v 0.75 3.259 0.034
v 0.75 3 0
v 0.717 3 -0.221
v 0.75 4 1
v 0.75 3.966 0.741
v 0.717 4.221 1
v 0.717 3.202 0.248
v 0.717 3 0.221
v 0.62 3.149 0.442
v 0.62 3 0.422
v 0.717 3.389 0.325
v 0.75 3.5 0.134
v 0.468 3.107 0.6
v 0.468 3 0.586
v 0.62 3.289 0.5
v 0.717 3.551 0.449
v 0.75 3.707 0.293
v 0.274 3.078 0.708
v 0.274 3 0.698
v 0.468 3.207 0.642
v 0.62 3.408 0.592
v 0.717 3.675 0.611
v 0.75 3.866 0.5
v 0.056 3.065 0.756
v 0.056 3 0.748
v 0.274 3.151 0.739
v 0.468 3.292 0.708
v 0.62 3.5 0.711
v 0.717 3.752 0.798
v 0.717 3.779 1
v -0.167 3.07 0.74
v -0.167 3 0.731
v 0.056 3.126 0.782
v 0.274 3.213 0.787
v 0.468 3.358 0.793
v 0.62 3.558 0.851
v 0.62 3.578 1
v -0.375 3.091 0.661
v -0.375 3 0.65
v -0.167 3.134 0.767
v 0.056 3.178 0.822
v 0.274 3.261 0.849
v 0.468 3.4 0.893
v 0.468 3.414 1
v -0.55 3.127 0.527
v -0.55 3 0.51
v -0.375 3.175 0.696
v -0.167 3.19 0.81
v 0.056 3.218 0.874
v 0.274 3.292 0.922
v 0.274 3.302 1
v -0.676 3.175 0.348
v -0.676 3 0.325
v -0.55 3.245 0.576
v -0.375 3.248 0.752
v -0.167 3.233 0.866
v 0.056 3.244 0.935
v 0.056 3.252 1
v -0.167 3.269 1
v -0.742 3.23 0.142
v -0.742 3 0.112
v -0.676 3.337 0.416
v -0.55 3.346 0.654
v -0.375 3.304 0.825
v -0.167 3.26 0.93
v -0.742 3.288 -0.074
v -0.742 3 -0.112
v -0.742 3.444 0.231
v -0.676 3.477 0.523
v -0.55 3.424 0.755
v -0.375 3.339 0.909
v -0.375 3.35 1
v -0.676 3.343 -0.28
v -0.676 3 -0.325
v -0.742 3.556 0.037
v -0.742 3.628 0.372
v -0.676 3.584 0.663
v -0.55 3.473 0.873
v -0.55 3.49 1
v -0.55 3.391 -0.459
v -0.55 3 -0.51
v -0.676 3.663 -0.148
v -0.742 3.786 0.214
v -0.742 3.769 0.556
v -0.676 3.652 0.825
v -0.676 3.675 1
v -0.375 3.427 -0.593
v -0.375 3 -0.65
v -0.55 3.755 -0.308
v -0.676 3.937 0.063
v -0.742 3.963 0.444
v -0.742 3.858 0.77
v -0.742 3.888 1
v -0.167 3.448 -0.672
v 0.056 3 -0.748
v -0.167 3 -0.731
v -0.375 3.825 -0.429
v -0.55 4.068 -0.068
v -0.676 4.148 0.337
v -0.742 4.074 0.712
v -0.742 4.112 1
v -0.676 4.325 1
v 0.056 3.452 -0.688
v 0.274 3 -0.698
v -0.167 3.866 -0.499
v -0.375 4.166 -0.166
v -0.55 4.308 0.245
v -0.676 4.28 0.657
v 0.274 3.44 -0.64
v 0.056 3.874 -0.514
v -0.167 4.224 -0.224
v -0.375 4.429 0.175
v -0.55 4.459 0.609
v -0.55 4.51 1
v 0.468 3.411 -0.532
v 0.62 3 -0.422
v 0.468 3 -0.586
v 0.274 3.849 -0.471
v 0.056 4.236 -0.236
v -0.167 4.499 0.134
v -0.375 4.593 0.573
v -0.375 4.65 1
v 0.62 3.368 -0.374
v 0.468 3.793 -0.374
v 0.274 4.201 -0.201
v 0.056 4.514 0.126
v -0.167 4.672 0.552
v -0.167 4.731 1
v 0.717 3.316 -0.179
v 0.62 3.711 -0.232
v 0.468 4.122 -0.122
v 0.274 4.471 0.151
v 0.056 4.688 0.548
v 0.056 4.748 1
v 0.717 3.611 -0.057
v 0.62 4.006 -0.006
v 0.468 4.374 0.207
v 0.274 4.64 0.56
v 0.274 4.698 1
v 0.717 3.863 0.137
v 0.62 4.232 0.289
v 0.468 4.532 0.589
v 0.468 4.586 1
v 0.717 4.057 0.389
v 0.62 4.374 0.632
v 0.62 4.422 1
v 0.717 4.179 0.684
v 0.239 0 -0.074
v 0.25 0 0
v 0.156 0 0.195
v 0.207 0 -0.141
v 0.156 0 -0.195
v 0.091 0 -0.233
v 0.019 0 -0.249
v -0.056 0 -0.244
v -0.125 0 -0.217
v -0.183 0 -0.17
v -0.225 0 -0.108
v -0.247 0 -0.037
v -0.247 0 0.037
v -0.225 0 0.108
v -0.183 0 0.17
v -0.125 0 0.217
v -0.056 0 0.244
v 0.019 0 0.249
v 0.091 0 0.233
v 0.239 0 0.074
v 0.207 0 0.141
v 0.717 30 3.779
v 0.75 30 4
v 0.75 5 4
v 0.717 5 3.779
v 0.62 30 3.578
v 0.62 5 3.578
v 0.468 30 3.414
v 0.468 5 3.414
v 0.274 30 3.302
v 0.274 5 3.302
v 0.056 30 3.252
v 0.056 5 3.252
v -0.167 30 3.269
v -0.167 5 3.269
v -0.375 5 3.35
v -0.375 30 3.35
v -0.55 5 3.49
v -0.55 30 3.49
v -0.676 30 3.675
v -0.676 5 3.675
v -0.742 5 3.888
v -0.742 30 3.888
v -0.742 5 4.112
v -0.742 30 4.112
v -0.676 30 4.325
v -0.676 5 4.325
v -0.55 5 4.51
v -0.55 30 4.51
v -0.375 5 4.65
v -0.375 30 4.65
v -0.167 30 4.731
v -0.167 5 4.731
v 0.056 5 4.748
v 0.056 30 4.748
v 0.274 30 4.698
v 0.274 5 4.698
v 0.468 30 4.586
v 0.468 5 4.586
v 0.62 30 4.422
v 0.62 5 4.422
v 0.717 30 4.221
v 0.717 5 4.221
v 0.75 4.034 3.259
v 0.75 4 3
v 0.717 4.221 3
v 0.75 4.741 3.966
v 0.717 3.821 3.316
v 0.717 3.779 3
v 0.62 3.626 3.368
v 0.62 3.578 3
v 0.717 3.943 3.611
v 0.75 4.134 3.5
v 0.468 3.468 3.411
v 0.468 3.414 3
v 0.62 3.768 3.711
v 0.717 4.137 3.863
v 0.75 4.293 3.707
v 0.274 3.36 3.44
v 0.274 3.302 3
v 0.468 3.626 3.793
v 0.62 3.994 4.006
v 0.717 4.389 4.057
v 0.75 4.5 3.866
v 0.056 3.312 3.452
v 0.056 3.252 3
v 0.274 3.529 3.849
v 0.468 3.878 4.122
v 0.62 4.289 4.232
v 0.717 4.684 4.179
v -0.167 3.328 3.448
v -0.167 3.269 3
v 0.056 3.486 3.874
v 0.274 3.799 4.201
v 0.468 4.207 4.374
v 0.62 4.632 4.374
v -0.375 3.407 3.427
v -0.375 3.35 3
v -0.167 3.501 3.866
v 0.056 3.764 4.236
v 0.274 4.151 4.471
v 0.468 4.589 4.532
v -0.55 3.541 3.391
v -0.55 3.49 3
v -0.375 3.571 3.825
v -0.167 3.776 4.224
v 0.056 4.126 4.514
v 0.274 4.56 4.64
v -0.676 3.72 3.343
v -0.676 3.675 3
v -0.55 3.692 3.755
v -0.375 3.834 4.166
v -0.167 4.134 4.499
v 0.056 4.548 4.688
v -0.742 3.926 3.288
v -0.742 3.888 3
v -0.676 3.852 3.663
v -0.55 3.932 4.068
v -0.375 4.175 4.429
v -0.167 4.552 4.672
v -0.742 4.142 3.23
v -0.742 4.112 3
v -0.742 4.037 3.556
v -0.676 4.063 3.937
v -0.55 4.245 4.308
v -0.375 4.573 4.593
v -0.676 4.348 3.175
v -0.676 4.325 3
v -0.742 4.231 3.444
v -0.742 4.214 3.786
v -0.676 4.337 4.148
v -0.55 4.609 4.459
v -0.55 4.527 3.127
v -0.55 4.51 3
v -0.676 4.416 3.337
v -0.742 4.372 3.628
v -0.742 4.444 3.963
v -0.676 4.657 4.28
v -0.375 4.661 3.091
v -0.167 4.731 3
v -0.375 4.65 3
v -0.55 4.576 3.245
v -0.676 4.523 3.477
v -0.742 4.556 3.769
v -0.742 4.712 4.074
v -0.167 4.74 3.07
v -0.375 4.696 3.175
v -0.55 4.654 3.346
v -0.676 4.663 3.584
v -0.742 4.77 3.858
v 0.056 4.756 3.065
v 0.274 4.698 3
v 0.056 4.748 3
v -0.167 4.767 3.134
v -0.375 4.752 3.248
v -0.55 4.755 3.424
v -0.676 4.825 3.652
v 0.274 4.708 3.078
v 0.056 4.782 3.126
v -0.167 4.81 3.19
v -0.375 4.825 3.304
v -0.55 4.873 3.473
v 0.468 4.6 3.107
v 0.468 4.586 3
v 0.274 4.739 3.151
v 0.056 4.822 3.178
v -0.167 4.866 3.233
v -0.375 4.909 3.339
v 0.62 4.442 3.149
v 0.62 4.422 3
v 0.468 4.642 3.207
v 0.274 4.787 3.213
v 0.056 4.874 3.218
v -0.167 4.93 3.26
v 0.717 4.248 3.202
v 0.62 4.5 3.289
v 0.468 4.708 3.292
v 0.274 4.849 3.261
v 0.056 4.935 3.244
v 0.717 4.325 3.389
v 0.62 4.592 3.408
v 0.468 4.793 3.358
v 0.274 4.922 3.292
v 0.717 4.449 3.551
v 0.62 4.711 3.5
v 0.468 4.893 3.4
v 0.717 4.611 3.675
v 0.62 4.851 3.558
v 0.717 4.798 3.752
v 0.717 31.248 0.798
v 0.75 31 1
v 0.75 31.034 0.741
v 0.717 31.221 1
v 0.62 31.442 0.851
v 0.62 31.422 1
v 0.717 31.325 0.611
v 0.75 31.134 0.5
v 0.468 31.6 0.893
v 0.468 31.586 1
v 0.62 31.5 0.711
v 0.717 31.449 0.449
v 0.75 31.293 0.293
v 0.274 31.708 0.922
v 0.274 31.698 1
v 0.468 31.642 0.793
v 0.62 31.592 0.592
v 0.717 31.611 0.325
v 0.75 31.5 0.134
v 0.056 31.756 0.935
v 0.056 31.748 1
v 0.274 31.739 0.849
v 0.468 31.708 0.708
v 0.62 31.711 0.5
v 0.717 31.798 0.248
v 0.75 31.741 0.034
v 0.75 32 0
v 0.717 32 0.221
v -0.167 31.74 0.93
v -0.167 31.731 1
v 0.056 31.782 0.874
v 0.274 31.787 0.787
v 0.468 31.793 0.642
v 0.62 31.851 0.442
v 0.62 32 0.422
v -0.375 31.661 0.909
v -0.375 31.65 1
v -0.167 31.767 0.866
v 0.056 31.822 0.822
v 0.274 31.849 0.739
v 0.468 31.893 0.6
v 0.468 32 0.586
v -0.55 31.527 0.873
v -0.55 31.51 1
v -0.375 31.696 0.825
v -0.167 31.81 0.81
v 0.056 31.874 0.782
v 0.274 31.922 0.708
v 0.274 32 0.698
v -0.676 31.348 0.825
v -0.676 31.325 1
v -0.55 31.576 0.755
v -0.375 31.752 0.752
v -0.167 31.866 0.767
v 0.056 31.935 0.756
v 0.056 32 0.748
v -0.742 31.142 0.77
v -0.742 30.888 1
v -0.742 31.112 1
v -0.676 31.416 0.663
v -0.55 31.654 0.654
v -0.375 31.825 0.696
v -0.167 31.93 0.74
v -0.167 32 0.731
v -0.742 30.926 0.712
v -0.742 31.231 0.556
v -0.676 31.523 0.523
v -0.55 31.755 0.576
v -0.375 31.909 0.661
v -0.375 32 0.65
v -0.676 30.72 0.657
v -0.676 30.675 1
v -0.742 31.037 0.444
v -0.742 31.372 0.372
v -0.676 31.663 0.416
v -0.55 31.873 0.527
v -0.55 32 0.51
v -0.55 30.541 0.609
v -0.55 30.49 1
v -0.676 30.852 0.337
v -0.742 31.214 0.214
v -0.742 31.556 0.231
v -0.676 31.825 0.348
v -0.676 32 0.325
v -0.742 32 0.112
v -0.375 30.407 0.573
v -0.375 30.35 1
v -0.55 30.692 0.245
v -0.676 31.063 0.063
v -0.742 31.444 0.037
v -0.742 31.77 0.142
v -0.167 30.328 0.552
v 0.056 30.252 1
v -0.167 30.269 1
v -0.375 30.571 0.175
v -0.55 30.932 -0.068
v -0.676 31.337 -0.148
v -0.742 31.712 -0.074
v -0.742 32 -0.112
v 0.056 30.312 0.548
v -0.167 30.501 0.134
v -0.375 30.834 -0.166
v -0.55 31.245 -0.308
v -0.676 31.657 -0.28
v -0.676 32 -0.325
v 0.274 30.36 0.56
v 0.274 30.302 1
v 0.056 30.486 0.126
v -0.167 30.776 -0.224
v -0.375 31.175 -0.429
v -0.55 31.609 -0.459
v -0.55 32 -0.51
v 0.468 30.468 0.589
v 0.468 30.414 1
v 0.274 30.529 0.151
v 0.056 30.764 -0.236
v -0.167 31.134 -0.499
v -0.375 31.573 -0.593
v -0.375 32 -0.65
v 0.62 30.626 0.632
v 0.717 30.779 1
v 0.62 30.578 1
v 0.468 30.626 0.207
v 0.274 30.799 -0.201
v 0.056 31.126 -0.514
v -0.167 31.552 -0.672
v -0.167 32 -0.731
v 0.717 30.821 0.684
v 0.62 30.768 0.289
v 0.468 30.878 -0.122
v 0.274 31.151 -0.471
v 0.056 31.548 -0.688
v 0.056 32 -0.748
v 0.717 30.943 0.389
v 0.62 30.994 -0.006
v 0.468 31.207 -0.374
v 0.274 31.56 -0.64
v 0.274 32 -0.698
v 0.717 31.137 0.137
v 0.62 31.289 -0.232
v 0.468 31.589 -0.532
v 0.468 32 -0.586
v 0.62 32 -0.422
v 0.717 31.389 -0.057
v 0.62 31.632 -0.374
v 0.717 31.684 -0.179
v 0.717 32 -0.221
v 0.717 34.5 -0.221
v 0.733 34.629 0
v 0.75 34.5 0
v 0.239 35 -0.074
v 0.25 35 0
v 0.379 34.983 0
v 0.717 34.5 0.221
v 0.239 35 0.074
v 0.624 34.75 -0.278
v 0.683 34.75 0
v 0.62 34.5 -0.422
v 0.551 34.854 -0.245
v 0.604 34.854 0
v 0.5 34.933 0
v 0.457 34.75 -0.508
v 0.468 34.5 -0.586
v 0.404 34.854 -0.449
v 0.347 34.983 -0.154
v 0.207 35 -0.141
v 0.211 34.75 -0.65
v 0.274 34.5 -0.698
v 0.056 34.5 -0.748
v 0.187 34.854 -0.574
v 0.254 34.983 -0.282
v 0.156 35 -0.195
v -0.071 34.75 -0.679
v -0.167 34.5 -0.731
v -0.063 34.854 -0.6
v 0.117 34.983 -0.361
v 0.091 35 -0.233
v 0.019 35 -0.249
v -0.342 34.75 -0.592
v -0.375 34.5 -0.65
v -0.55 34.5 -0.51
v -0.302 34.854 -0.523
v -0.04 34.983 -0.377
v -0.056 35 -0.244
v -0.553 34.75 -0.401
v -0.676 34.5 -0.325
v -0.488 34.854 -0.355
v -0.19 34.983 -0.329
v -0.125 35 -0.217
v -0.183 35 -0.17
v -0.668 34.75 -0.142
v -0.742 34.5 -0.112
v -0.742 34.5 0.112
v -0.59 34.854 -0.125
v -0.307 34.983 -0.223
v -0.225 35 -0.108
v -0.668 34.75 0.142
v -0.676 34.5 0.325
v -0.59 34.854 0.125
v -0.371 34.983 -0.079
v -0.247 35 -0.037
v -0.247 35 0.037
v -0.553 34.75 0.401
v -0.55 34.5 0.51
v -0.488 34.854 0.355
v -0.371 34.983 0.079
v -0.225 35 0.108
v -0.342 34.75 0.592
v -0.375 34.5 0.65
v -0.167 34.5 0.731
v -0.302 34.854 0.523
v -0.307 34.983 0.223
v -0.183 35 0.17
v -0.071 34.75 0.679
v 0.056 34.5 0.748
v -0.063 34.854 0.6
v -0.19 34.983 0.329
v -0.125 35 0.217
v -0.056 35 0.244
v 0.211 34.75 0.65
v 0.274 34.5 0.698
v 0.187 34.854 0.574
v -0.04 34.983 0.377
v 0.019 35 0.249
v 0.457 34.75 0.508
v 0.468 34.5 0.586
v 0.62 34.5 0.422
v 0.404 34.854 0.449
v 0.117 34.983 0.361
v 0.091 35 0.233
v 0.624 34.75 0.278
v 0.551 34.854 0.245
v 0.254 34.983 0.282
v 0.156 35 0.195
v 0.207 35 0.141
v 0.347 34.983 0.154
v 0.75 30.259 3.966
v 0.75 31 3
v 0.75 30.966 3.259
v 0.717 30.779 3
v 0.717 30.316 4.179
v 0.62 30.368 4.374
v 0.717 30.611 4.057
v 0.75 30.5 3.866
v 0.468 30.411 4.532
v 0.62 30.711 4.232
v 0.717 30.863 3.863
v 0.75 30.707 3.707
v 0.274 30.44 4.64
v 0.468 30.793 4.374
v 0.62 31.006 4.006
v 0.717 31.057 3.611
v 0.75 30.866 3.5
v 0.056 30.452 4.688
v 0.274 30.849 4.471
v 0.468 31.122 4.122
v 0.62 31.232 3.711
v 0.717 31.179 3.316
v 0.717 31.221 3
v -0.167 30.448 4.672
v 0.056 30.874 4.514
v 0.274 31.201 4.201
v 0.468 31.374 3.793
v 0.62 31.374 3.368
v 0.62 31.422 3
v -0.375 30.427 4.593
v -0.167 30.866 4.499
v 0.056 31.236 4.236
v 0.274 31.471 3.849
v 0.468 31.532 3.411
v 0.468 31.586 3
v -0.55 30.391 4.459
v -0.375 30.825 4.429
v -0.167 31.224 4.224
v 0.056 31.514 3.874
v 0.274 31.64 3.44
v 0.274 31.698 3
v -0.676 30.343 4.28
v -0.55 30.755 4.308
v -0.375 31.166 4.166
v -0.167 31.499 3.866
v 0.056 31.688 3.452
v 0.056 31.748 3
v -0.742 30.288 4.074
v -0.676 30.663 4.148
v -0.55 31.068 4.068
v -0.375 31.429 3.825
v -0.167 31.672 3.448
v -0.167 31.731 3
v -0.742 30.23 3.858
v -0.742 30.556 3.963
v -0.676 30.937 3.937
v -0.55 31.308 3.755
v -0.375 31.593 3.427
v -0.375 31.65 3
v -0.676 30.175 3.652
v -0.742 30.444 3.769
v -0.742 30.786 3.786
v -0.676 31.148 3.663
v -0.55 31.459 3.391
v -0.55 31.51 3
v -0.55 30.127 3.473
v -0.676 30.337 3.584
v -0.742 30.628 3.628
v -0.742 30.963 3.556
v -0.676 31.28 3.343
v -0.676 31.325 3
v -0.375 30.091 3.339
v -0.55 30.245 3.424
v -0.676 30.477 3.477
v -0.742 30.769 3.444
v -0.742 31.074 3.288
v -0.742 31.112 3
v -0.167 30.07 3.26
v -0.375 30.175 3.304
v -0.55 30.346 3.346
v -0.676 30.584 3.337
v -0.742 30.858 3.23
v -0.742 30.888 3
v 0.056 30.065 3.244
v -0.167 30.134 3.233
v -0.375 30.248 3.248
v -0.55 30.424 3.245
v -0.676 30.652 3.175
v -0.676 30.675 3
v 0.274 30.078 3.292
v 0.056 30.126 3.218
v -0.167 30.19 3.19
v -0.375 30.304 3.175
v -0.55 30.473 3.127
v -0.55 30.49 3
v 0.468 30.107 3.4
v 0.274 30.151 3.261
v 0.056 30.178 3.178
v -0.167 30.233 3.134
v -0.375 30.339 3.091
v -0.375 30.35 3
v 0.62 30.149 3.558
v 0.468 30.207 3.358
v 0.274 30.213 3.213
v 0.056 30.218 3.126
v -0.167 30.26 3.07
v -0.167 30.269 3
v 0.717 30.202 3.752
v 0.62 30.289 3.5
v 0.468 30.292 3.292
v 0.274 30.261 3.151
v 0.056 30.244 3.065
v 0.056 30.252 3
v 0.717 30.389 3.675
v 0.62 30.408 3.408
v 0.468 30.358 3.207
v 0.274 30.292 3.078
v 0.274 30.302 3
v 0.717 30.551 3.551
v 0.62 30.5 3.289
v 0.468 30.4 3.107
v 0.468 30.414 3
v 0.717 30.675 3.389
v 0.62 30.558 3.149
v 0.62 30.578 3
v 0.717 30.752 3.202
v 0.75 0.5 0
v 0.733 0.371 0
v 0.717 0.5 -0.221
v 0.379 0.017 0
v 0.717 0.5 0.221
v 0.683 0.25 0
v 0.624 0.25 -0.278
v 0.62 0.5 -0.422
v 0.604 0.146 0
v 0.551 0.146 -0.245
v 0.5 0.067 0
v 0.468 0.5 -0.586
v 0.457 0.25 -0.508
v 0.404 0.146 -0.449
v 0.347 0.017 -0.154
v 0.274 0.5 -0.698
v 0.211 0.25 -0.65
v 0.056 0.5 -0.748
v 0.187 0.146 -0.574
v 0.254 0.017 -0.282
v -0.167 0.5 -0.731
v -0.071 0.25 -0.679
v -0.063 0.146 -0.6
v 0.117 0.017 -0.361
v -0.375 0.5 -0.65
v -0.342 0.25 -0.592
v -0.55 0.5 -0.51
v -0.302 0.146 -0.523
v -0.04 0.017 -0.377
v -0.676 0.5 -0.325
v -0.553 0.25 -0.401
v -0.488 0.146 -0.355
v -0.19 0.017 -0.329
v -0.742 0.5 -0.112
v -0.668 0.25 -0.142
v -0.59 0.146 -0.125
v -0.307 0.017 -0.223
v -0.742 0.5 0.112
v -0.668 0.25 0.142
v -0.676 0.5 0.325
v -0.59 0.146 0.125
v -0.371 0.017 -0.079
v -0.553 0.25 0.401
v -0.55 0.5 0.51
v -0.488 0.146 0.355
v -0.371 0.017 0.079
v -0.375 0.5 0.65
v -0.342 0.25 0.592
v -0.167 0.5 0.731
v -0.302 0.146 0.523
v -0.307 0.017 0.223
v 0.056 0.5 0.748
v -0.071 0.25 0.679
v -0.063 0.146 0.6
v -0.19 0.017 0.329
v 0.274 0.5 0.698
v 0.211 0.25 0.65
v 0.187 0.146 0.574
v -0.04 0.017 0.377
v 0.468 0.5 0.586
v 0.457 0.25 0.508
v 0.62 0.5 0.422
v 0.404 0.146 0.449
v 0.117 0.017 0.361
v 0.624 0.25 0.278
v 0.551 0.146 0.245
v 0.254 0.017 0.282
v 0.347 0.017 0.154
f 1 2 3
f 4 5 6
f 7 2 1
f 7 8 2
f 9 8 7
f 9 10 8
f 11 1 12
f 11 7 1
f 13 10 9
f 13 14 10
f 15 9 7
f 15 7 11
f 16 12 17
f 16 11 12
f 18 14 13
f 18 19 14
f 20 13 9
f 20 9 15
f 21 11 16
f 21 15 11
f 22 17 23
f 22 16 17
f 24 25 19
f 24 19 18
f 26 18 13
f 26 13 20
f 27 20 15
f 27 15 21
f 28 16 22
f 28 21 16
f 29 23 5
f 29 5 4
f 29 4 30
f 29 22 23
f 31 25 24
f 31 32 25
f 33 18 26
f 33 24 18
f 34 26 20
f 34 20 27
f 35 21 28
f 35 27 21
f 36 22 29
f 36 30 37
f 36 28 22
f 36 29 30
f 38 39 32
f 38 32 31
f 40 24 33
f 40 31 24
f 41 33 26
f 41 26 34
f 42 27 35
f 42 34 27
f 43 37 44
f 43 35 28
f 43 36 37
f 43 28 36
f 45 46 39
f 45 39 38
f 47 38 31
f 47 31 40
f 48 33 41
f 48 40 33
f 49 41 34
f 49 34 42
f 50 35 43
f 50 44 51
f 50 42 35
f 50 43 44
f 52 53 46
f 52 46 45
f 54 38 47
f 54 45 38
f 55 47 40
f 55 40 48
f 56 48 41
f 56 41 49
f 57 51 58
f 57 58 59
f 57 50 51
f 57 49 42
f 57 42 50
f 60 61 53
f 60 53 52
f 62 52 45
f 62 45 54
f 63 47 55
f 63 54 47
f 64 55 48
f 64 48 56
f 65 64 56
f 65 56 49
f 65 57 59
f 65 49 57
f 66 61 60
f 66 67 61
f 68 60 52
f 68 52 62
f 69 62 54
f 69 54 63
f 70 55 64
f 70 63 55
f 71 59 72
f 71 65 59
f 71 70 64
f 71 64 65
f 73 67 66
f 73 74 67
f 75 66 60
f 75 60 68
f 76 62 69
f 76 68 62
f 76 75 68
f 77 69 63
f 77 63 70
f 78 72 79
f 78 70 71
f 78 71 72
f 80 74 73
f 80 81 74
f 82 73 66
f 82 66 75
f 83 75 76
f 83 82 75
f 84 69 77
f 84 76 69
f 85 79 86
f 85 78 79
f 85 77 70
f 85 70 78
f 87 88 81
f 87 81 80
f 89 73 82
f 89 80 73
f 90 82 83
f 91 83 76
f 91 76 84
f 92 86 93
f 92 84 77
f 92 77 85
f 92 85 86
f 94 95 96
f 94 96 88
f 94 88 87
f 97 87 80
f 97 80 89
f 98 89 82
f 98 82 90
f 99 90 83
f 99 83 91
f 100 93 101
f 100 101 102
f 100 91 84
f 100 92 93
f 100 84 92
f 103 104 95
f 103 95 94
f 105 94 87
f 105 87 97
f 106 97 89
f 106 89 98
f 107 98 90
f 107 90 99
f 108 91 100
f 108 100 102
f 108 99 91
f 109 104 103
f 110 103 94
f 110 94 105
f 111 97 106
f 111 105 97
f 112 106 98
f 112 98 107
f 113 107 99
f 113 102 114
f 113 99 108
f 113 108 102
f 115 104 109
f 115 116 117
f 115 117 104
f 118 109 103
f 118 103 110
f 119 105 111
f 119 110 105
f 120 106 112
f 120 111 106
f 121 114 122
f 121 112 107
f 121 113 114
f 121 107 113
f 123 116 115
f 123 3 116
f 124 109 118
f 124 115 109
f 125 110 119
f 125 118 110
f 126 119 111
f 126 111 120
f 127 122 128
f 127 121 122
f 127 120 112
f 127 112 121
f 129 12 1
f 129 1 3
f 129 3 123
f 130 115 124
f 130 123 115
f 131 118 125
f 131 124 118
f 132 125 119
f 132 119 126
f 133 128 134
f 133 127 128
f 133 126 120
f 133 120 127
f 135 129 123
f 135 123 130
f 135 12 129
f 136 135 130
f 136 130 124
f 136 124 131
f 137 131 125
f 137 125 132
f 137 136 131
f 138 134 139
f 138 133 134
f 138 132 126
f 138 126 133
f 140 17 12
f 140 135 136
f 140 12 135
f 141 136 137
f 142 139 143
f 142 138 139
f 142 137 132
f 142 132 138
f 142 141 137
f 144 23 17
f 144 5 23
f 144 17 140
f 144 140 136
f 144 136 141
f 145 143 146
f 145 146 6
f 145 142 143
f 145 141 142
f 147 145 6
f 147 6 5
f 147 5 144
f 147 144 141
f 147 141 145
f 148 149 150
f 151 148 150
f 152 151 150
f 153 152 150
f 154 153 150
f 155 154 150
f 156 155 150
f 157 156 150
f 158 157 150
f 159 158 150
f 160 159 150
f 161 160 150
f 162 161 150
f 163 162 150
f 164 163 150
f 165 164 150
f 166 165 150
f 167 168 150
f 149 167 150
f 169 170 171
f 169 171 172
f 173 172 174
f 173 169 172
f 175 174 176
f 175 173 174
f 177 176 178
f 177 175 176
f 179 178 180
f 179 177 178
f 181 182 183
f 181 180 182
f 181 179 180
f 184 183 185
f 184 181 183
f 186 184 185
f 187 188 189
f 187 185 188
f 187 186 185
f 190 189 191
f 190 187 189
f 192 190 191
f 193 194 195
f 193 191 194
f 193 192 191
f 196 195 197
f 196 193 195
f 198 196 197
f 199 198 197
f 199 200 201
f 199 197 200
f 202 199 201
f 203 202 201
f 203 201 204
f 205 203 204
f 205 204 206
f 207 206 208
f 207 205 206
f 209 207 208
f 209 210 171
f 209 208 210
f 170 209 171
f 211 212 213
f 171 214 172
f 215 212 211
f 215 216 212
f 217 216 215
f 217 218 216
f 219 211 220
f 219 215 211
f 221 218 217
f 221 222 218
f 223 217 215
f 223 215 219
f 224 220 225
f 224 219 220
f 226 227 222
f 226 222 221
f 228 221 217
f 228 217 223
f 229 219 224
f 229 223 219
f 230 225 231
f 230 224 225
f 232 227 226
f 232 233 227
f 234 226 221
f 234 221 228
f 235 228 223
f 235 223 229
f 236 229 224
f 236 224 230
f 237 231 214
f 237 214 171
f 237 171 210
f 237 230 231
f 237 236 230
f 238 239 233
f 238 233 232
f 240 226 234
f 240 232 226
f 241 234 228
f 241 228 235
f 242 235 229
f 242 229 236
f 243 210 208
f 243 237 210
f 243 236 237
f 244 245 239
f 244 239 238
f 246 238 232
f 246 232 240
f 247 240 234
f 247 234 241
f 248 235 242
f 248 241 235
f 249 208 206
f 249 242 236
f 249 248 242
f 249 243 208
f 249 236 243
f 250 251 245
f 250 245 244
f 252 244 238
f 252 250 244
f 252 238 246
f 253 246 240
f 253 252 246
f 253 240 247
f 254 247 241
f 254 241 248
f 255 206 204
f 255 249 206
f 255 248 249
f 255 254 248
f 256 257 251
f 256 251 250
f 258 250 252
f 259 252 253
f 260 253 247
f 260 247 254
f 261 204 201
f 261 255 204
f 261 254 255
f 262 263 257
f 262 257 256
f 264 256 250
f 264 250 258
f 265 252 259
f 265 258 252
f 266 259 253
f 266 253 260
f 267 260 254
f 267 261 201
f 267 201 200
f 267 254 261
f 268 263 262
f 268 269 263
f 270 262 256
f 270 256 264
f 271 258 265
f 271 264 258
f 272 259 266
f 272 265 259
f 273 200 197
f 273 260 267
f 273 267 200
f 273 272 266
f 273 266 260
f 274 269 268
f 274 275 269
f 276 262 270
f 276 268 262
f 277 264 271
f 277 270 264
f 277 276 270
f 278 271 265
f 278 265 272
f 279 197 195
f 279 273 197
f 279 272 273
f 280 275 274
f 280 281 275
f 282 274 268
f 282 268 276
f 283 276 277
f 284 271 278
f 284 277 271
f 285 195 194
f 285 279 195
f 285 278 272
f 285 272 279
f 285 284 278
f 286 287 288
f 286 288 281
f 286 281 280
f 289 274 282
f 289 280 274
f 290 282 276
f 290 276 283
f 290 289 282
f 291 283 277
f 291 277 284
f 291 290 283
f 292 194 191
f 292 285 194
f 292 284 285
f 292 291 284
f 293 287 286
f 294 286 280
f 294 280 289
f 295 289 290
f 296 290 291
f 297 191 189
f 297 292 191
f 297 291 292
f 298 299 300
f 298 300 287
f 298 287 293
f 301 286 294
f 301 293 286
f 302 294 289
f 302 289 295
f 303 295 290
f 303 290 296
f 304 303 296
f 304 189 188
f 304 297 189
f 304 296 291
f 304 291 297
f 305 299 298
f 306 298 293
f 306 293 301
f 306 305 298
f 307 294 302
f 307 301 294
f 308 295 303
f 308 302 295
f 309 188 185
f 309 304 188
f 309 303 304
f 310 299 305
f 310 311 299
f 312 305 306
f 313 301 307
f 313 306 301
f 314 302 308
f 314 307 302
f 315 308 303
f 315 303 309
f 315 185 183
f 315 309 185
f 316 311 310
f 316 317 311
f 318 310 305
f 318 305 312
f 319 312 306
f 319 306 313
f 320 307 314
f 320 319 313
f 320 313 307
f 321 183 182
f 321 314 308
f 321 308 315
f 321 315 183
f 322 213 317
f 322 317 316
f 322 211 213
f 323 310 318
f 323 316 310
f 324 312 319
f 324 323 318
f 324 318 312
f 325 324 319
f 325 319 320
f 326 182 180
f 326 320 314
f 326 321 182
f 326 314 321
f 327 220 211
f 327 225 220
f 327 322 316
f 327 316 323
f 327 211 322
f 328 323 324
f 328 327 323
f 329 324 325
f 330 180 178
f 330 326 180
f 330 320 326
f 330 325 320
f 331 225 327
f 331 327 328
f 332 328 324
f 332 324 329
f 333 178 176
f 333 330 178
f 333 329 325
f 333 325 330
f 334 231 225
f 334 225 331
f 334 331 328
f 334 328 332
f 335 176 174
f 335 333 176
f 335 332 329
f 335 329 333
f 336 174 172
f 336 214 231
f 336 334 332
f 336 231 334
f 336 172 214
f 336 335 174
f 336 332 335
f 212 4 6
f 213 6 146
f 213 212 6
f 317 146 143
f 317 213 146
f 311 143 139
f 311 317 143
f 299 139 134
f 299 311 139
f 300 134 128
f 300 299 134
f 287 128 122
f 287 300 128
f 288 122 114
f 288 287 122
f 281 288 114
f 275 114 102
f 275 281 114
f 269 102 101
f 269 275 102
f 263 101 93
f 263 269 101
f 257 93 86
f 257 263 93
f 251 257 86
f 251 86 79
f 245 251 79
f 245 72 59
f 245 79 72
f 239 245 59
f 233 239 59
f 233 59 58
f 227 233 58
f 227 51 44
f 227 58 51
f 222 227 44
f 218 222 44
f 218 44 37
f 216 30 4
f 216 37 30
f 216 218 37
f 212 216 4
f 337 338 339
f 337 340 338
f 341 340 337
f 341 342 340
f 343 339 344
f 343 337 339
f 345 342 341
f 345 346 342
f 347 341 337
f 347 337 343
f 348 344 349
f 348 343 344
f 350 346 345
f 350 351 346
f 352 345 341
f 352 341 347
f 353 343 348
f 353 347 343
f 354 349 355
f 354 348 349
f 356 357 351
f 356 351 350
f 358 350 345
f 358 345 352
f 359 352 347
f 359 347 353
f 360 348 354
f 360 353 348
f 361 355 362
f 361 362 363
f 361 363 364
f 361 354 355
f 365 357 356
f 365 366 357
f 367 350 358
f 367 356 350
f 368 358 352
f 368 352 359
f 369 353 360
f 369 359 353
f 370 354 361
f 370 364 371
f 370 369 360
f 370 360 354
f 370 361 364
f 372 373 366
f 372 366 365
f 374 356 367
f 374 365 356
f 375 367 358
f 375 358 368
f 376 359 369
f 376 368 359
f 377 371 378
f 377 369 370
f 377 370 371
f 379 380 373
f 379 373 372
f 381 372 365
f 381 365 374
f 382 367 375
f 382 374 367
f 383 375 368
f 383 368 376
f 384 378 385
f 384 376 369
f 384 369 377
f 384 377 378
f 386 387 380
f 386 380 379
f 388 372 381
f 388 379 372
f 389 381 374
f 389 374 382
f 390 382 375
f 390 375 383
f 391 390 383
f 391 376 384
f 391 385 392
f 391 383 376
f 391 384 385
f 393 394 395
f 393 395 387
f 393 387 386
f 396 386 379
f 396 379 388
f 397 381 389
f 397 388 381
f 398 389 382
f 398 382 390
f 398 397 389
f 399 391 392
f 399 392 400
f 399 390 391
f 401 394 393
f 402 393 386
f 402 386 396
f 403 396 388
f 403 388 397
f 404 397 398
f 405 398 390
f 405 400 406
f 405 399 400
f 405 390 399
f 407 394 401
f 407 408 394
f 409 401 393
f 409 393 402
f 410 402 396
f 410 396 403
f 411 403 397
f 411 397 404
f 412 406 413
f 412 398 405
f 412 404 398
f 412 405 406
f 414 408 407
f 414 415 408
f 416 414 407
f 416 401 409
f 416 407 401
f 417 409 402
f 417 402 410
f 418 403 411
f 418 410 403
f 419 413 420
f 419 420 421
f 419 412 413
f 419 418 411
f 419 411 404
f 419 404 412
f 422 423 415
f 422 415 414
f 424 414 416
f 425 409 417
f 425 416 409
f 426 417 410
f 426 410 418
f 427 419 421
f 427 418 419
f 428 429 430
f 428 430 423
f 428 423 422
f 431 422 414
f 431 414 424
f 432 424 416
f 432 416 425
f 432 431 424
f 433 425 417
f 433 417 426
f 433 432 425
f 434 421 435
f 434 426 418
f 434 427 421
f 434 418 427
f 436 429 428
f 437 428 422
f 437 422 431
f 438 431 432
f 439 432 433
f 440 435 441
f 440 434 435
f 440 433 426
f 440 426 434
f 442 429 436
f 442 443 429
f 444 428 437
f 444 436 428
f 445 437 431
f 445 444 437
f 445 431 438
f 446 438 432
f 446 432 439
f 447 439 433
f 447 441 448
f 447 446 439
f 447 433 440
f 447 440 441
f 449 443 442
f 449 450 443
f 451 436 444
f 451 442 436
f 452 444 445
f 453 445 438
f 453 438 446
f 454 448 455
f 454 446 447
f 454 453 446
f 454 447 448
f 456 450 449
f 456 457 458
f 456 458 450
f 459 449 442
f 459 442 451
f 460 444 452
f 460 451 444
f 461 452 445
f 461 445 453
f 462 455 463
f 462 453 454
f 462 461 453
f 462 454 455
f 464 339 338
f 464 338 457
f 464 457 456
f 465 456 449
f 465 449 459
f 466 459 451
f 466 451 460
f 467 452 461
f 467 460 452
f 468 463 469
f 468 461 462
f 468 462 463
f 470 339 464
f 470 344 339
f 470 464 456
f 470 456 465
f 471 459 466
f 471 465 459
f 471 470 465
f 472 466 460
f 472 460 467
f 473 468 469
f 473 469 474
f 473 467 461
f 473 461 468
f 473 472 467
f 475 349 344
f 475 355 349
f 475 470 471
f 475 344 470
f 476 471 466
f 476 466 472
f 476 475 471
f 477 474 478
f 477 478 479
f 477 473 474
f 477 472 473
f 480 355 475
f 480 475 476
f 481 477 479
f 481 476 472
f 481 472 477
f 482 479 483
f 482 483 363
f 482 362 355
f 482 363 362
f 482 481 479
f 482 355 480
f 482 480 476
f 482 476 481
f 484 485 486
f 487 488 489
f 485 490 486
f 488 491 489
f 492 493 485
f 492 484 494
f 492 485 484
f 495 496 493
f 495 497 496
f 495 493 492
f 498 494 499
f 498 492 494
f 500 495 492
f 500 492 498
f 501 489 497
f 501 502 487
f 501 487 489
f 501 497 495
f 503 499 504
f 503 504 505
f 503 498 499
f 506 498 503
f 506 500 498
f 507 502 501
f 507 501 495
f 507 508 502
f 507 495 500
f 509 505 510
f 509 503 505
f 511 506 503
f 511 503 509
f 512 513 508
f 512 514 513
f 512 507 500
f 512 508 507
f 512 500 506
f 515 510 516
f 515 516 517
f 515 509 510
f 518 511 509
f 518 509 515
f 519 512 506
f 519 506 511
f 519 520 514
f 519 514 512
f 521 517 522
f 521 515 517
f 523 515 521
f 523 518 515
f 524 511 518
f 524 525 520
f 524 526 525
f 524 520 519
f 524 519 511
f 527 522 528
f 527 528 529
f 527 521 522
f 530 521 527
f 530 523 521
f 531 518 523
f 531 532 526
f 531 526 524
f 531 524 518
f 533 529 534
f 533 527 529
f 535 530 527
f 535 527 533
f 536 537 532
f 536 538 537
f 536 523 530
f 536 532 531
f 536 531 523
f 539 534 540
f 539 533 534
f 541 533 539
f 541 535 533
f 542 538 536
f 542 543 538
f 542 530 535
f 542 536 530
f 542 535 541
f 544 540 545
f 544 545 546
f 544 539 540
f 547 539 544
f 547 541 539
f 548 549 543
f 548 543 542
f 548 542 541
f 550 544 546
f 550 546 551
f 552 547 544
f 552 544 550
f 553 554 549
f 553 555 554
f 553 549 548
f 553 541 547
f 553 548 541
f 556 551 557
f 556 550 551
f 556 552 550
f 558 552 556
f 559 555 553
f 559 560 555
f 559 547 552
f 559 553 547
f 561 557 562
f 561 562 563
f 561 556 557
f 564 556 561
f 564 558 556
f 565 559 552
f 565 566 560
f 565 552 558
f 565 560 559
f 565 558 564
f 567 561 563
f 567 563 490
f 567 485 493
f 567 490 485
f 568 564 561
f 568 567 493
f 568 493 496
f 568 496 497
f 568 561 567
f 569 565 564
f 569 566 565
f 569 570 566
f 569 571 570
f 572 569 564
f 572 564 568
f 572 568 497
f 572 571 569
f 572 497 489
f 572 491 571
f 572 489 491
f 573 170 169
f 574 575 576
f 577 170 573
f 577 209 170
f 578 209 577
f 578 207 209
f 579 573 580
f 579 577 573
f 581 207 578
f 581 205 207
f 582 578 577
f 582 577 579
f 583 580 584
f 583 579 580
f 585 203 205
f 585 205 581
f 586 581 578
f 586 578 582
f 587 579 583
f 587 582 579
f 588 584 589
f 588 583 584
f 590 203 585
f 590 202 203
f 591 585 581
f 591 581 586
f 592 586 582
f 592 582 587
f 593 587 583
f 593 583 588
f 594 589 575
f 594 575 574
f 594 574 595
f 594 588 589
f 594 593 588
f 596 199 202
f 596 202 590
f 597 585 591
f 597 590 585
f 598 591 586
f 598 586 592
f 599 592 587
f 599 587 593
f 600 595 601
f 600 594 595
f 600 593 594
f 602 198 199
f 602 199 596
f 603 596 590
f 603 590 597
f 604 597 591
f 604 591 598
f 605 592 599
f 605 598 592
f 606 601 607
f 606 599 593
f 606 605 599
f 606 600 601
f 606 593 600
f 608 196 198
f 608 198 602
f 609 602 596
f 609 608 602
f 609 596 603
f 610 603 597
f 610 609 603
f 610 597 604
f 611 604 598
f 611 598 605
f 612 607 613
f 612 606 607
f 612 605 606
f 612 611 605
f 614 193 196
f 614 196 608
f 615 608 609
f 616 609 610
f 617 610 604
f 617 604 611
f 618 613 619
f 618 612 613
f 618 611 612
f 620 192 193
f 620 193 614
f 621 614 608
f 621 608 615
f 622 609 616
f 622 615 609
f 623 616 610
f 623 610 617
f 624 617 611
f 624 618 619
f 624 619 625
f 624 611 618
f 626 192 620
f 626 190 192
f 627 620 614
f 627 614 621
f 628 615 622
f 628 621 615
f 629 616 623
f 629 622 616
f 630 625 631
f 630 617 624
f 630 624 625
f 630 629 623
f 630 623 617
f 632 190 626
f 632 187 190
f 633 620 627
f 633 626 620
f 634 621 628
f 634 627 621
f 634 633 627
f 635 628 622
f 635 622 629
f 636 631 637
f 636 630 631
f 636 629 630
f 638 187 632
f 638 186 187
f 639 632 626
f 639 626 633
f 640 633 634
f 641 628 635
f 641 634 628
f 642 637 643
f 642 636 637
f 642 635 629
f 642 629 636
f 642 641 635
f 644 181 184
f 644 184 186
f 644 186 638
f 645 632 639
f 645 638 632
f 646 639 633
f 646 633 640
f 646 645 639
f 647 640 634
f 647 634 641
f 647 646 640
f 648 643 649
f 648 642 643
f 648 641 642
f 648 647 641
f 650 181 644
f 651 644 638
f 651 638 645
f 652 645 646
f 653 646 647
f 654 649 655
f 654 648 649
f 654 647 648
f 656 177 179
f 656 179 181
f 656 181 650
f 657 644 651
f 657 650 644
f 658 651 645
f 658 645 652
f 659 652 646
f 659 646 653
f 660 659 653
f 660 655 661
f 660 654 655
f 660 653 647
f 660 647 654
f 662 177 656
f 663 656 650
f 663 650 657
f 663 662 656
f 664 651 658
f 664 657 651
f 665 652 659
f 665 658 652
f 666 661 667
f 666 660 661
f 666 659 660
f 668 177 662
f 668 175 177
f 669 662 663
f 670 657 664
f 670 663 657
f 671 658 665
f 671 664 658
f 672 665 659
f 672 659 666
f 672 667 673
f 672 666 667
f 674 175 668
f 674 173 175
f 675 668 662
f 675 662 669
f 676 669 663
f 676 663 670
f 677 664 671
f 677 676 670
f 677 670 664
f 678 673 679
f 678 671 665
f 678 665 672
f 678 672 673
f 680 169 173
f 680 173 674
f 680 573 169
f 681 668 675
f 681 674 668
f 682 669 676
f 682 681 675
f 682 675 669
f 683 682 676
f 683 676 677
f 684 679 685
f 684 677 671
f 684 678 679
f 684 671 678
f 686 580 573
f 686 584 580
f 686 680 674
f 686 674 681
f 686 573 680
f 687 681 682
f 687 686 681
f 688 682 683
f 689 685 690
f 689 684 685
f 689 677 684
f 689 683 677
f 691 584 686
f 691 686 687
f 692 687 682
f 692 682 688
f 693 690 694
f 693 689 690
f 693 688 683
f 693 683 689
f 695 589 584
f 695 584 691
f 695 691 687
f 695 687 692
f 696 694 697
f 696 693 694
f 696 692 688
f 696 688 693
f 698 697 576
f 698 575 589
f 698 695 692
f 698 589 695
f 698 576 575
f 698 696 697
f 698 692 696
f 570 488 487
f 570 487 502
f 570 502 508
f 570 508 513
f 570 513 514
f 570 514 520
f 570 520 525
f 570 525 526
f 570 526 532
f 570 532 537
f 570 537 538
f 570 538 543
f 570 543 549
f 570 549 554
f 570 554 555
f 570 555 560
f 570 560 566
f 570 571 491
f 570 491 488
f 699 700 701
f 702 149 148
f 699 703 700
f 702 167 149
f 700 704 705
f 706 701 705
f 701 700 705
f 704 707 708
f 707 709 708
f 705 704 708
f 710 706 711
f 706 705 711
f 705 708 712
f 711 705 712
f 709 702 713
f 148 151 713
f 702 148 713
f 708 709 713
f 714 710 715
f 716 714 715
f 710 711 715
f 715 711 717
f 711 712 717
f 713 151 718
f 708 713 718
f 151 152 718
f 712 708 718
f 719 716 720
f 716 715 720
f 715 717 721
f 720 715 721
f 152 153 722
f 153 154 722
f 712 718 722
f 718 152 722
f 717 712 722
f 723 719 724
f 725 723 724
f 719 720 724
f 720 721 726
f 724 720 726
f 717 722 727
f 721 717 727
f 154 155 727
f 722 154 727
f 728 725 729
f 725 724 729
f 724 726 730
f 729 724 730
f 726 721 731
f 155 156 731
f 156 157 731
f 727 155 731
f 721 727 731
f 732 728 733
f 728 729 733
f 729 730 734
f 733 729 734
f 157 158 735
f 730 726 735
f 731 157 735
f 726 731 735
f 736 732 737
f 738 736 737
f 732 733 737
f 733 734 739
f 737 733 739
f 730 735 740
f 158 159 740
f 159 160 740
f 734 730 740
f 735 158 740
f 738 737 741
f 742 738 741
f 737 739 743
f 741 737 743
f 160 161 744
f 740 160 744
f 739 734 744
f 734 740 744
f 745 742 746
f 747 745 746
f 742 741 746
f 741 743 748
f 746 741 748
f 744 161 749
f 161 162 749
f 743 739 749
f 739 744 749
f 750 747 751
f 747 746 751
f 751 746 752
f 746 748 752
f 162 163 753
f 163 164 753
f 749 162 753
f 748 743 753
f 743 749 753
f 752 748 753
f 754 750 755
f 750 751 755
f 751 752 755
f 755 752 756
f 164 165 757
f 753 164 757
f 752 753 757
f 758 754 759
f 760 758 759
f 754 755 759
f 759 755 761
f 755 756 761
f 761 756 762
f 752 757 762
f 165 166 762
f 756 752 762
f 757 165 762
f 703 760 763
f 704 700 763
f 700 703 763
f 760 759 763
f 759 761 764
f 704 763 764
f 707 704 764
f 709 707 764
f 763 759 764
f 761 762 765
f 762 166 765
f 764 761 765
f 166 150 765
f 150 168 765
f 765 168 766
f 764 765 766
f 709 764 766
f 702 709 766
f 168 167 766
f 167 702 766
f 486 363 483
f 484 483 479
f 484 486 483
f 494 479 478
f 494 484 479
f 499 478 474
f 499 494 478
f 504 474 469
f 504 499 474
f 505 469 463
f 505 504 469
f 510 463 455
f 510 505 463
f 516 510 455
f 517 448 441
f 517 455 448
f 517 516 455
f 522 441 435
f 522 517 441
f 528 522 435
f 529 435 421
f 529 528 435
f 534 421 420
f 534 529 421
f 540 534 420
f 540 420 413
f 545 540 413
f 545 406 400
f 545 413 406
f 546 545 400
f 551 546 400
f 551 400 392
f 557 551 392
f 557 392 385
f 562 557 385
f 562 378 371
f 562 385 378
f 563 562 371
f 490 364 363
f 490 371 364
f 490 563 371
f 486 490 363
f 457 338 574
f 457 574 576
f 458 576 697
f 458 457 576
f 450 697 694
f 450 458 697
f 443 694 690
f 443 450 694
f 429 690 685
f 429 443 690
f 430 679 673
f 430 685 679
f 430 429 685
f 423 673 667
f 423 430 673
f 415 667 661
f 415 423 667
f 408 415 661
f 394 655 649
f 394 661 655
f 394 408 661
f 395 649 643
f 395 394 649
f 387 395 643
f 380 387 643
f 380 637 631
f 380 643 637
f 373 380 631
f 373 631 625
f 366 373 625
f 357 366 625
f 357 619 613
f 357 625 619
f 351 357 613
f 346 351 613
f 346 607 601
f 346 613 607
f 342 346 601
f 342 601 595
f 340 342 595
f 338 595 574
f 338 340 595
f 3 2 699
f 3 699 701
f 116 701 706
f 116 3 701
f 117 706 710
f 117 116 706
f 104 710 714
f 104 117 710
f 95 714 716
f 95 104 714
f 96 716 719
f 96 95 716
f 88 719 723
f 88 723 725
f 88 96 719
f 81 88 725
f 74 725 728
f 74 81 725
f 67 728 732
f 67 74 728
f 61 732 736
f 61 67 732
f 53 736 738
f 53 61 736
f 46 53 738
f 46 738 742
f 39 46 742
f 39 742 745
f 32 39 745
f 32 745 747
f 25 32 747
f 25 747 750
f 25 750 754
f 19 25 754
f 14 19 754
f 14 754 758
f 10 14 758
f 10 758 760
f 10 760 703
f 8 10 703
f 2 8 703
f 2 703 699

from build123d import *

# Parameters (mm, degrees)
SKETCH2_R = 0.75
FILLET1_R = 0.5


with BuildPart() as part:
    # Sweep1: sweep along a curve in space
    with BuildLine() as sweep1_path:
        Line((0, 0, 0), (0, 3, 0))
        ThreePointArc((0, 3, 0), (0, 3.707106781, 0.292893219), (0, 4, 1))
        Line((0, 4, 1), (0, 4, 3))
        ThreePointArc((0, 4, 3), (0, 4.292893219, 3.707106781), (0, 5, 4))
        Line((0, 5, 4), (0, 30, 4))
        ThreePointArc((0, 30, 4), (0, 30.707106781, 3.707106781), (0, 31, 3))
        Line((0, 31, 3), (0, 31, 1))
        ThreePointArc((0, 31, 1), (0, 31.292893219, 0.292893219), (0, 32, 0))
        Line((0, 32, 0), (0, 35, 0))
    # Sketch2 → Sweep1 (sweep)
    with BuildSketch(Plane(origin=(0, 0, 0), x_dir=(1, 0, 0), z_dir=(0, 1, 0))):
        Circle(SKETCH2_R)
    sweep(path=sweep1_path.line)

    # Fillet1
    fillet1_edges = [part.edges().sort_by_distance(p)[0] for p in [
        (-0.75, 35, 0),
        (-0.75, 0, 0),
    ]]
    fillet(fillet1_edges, radius=FILLET1_R)


solid = part.part
